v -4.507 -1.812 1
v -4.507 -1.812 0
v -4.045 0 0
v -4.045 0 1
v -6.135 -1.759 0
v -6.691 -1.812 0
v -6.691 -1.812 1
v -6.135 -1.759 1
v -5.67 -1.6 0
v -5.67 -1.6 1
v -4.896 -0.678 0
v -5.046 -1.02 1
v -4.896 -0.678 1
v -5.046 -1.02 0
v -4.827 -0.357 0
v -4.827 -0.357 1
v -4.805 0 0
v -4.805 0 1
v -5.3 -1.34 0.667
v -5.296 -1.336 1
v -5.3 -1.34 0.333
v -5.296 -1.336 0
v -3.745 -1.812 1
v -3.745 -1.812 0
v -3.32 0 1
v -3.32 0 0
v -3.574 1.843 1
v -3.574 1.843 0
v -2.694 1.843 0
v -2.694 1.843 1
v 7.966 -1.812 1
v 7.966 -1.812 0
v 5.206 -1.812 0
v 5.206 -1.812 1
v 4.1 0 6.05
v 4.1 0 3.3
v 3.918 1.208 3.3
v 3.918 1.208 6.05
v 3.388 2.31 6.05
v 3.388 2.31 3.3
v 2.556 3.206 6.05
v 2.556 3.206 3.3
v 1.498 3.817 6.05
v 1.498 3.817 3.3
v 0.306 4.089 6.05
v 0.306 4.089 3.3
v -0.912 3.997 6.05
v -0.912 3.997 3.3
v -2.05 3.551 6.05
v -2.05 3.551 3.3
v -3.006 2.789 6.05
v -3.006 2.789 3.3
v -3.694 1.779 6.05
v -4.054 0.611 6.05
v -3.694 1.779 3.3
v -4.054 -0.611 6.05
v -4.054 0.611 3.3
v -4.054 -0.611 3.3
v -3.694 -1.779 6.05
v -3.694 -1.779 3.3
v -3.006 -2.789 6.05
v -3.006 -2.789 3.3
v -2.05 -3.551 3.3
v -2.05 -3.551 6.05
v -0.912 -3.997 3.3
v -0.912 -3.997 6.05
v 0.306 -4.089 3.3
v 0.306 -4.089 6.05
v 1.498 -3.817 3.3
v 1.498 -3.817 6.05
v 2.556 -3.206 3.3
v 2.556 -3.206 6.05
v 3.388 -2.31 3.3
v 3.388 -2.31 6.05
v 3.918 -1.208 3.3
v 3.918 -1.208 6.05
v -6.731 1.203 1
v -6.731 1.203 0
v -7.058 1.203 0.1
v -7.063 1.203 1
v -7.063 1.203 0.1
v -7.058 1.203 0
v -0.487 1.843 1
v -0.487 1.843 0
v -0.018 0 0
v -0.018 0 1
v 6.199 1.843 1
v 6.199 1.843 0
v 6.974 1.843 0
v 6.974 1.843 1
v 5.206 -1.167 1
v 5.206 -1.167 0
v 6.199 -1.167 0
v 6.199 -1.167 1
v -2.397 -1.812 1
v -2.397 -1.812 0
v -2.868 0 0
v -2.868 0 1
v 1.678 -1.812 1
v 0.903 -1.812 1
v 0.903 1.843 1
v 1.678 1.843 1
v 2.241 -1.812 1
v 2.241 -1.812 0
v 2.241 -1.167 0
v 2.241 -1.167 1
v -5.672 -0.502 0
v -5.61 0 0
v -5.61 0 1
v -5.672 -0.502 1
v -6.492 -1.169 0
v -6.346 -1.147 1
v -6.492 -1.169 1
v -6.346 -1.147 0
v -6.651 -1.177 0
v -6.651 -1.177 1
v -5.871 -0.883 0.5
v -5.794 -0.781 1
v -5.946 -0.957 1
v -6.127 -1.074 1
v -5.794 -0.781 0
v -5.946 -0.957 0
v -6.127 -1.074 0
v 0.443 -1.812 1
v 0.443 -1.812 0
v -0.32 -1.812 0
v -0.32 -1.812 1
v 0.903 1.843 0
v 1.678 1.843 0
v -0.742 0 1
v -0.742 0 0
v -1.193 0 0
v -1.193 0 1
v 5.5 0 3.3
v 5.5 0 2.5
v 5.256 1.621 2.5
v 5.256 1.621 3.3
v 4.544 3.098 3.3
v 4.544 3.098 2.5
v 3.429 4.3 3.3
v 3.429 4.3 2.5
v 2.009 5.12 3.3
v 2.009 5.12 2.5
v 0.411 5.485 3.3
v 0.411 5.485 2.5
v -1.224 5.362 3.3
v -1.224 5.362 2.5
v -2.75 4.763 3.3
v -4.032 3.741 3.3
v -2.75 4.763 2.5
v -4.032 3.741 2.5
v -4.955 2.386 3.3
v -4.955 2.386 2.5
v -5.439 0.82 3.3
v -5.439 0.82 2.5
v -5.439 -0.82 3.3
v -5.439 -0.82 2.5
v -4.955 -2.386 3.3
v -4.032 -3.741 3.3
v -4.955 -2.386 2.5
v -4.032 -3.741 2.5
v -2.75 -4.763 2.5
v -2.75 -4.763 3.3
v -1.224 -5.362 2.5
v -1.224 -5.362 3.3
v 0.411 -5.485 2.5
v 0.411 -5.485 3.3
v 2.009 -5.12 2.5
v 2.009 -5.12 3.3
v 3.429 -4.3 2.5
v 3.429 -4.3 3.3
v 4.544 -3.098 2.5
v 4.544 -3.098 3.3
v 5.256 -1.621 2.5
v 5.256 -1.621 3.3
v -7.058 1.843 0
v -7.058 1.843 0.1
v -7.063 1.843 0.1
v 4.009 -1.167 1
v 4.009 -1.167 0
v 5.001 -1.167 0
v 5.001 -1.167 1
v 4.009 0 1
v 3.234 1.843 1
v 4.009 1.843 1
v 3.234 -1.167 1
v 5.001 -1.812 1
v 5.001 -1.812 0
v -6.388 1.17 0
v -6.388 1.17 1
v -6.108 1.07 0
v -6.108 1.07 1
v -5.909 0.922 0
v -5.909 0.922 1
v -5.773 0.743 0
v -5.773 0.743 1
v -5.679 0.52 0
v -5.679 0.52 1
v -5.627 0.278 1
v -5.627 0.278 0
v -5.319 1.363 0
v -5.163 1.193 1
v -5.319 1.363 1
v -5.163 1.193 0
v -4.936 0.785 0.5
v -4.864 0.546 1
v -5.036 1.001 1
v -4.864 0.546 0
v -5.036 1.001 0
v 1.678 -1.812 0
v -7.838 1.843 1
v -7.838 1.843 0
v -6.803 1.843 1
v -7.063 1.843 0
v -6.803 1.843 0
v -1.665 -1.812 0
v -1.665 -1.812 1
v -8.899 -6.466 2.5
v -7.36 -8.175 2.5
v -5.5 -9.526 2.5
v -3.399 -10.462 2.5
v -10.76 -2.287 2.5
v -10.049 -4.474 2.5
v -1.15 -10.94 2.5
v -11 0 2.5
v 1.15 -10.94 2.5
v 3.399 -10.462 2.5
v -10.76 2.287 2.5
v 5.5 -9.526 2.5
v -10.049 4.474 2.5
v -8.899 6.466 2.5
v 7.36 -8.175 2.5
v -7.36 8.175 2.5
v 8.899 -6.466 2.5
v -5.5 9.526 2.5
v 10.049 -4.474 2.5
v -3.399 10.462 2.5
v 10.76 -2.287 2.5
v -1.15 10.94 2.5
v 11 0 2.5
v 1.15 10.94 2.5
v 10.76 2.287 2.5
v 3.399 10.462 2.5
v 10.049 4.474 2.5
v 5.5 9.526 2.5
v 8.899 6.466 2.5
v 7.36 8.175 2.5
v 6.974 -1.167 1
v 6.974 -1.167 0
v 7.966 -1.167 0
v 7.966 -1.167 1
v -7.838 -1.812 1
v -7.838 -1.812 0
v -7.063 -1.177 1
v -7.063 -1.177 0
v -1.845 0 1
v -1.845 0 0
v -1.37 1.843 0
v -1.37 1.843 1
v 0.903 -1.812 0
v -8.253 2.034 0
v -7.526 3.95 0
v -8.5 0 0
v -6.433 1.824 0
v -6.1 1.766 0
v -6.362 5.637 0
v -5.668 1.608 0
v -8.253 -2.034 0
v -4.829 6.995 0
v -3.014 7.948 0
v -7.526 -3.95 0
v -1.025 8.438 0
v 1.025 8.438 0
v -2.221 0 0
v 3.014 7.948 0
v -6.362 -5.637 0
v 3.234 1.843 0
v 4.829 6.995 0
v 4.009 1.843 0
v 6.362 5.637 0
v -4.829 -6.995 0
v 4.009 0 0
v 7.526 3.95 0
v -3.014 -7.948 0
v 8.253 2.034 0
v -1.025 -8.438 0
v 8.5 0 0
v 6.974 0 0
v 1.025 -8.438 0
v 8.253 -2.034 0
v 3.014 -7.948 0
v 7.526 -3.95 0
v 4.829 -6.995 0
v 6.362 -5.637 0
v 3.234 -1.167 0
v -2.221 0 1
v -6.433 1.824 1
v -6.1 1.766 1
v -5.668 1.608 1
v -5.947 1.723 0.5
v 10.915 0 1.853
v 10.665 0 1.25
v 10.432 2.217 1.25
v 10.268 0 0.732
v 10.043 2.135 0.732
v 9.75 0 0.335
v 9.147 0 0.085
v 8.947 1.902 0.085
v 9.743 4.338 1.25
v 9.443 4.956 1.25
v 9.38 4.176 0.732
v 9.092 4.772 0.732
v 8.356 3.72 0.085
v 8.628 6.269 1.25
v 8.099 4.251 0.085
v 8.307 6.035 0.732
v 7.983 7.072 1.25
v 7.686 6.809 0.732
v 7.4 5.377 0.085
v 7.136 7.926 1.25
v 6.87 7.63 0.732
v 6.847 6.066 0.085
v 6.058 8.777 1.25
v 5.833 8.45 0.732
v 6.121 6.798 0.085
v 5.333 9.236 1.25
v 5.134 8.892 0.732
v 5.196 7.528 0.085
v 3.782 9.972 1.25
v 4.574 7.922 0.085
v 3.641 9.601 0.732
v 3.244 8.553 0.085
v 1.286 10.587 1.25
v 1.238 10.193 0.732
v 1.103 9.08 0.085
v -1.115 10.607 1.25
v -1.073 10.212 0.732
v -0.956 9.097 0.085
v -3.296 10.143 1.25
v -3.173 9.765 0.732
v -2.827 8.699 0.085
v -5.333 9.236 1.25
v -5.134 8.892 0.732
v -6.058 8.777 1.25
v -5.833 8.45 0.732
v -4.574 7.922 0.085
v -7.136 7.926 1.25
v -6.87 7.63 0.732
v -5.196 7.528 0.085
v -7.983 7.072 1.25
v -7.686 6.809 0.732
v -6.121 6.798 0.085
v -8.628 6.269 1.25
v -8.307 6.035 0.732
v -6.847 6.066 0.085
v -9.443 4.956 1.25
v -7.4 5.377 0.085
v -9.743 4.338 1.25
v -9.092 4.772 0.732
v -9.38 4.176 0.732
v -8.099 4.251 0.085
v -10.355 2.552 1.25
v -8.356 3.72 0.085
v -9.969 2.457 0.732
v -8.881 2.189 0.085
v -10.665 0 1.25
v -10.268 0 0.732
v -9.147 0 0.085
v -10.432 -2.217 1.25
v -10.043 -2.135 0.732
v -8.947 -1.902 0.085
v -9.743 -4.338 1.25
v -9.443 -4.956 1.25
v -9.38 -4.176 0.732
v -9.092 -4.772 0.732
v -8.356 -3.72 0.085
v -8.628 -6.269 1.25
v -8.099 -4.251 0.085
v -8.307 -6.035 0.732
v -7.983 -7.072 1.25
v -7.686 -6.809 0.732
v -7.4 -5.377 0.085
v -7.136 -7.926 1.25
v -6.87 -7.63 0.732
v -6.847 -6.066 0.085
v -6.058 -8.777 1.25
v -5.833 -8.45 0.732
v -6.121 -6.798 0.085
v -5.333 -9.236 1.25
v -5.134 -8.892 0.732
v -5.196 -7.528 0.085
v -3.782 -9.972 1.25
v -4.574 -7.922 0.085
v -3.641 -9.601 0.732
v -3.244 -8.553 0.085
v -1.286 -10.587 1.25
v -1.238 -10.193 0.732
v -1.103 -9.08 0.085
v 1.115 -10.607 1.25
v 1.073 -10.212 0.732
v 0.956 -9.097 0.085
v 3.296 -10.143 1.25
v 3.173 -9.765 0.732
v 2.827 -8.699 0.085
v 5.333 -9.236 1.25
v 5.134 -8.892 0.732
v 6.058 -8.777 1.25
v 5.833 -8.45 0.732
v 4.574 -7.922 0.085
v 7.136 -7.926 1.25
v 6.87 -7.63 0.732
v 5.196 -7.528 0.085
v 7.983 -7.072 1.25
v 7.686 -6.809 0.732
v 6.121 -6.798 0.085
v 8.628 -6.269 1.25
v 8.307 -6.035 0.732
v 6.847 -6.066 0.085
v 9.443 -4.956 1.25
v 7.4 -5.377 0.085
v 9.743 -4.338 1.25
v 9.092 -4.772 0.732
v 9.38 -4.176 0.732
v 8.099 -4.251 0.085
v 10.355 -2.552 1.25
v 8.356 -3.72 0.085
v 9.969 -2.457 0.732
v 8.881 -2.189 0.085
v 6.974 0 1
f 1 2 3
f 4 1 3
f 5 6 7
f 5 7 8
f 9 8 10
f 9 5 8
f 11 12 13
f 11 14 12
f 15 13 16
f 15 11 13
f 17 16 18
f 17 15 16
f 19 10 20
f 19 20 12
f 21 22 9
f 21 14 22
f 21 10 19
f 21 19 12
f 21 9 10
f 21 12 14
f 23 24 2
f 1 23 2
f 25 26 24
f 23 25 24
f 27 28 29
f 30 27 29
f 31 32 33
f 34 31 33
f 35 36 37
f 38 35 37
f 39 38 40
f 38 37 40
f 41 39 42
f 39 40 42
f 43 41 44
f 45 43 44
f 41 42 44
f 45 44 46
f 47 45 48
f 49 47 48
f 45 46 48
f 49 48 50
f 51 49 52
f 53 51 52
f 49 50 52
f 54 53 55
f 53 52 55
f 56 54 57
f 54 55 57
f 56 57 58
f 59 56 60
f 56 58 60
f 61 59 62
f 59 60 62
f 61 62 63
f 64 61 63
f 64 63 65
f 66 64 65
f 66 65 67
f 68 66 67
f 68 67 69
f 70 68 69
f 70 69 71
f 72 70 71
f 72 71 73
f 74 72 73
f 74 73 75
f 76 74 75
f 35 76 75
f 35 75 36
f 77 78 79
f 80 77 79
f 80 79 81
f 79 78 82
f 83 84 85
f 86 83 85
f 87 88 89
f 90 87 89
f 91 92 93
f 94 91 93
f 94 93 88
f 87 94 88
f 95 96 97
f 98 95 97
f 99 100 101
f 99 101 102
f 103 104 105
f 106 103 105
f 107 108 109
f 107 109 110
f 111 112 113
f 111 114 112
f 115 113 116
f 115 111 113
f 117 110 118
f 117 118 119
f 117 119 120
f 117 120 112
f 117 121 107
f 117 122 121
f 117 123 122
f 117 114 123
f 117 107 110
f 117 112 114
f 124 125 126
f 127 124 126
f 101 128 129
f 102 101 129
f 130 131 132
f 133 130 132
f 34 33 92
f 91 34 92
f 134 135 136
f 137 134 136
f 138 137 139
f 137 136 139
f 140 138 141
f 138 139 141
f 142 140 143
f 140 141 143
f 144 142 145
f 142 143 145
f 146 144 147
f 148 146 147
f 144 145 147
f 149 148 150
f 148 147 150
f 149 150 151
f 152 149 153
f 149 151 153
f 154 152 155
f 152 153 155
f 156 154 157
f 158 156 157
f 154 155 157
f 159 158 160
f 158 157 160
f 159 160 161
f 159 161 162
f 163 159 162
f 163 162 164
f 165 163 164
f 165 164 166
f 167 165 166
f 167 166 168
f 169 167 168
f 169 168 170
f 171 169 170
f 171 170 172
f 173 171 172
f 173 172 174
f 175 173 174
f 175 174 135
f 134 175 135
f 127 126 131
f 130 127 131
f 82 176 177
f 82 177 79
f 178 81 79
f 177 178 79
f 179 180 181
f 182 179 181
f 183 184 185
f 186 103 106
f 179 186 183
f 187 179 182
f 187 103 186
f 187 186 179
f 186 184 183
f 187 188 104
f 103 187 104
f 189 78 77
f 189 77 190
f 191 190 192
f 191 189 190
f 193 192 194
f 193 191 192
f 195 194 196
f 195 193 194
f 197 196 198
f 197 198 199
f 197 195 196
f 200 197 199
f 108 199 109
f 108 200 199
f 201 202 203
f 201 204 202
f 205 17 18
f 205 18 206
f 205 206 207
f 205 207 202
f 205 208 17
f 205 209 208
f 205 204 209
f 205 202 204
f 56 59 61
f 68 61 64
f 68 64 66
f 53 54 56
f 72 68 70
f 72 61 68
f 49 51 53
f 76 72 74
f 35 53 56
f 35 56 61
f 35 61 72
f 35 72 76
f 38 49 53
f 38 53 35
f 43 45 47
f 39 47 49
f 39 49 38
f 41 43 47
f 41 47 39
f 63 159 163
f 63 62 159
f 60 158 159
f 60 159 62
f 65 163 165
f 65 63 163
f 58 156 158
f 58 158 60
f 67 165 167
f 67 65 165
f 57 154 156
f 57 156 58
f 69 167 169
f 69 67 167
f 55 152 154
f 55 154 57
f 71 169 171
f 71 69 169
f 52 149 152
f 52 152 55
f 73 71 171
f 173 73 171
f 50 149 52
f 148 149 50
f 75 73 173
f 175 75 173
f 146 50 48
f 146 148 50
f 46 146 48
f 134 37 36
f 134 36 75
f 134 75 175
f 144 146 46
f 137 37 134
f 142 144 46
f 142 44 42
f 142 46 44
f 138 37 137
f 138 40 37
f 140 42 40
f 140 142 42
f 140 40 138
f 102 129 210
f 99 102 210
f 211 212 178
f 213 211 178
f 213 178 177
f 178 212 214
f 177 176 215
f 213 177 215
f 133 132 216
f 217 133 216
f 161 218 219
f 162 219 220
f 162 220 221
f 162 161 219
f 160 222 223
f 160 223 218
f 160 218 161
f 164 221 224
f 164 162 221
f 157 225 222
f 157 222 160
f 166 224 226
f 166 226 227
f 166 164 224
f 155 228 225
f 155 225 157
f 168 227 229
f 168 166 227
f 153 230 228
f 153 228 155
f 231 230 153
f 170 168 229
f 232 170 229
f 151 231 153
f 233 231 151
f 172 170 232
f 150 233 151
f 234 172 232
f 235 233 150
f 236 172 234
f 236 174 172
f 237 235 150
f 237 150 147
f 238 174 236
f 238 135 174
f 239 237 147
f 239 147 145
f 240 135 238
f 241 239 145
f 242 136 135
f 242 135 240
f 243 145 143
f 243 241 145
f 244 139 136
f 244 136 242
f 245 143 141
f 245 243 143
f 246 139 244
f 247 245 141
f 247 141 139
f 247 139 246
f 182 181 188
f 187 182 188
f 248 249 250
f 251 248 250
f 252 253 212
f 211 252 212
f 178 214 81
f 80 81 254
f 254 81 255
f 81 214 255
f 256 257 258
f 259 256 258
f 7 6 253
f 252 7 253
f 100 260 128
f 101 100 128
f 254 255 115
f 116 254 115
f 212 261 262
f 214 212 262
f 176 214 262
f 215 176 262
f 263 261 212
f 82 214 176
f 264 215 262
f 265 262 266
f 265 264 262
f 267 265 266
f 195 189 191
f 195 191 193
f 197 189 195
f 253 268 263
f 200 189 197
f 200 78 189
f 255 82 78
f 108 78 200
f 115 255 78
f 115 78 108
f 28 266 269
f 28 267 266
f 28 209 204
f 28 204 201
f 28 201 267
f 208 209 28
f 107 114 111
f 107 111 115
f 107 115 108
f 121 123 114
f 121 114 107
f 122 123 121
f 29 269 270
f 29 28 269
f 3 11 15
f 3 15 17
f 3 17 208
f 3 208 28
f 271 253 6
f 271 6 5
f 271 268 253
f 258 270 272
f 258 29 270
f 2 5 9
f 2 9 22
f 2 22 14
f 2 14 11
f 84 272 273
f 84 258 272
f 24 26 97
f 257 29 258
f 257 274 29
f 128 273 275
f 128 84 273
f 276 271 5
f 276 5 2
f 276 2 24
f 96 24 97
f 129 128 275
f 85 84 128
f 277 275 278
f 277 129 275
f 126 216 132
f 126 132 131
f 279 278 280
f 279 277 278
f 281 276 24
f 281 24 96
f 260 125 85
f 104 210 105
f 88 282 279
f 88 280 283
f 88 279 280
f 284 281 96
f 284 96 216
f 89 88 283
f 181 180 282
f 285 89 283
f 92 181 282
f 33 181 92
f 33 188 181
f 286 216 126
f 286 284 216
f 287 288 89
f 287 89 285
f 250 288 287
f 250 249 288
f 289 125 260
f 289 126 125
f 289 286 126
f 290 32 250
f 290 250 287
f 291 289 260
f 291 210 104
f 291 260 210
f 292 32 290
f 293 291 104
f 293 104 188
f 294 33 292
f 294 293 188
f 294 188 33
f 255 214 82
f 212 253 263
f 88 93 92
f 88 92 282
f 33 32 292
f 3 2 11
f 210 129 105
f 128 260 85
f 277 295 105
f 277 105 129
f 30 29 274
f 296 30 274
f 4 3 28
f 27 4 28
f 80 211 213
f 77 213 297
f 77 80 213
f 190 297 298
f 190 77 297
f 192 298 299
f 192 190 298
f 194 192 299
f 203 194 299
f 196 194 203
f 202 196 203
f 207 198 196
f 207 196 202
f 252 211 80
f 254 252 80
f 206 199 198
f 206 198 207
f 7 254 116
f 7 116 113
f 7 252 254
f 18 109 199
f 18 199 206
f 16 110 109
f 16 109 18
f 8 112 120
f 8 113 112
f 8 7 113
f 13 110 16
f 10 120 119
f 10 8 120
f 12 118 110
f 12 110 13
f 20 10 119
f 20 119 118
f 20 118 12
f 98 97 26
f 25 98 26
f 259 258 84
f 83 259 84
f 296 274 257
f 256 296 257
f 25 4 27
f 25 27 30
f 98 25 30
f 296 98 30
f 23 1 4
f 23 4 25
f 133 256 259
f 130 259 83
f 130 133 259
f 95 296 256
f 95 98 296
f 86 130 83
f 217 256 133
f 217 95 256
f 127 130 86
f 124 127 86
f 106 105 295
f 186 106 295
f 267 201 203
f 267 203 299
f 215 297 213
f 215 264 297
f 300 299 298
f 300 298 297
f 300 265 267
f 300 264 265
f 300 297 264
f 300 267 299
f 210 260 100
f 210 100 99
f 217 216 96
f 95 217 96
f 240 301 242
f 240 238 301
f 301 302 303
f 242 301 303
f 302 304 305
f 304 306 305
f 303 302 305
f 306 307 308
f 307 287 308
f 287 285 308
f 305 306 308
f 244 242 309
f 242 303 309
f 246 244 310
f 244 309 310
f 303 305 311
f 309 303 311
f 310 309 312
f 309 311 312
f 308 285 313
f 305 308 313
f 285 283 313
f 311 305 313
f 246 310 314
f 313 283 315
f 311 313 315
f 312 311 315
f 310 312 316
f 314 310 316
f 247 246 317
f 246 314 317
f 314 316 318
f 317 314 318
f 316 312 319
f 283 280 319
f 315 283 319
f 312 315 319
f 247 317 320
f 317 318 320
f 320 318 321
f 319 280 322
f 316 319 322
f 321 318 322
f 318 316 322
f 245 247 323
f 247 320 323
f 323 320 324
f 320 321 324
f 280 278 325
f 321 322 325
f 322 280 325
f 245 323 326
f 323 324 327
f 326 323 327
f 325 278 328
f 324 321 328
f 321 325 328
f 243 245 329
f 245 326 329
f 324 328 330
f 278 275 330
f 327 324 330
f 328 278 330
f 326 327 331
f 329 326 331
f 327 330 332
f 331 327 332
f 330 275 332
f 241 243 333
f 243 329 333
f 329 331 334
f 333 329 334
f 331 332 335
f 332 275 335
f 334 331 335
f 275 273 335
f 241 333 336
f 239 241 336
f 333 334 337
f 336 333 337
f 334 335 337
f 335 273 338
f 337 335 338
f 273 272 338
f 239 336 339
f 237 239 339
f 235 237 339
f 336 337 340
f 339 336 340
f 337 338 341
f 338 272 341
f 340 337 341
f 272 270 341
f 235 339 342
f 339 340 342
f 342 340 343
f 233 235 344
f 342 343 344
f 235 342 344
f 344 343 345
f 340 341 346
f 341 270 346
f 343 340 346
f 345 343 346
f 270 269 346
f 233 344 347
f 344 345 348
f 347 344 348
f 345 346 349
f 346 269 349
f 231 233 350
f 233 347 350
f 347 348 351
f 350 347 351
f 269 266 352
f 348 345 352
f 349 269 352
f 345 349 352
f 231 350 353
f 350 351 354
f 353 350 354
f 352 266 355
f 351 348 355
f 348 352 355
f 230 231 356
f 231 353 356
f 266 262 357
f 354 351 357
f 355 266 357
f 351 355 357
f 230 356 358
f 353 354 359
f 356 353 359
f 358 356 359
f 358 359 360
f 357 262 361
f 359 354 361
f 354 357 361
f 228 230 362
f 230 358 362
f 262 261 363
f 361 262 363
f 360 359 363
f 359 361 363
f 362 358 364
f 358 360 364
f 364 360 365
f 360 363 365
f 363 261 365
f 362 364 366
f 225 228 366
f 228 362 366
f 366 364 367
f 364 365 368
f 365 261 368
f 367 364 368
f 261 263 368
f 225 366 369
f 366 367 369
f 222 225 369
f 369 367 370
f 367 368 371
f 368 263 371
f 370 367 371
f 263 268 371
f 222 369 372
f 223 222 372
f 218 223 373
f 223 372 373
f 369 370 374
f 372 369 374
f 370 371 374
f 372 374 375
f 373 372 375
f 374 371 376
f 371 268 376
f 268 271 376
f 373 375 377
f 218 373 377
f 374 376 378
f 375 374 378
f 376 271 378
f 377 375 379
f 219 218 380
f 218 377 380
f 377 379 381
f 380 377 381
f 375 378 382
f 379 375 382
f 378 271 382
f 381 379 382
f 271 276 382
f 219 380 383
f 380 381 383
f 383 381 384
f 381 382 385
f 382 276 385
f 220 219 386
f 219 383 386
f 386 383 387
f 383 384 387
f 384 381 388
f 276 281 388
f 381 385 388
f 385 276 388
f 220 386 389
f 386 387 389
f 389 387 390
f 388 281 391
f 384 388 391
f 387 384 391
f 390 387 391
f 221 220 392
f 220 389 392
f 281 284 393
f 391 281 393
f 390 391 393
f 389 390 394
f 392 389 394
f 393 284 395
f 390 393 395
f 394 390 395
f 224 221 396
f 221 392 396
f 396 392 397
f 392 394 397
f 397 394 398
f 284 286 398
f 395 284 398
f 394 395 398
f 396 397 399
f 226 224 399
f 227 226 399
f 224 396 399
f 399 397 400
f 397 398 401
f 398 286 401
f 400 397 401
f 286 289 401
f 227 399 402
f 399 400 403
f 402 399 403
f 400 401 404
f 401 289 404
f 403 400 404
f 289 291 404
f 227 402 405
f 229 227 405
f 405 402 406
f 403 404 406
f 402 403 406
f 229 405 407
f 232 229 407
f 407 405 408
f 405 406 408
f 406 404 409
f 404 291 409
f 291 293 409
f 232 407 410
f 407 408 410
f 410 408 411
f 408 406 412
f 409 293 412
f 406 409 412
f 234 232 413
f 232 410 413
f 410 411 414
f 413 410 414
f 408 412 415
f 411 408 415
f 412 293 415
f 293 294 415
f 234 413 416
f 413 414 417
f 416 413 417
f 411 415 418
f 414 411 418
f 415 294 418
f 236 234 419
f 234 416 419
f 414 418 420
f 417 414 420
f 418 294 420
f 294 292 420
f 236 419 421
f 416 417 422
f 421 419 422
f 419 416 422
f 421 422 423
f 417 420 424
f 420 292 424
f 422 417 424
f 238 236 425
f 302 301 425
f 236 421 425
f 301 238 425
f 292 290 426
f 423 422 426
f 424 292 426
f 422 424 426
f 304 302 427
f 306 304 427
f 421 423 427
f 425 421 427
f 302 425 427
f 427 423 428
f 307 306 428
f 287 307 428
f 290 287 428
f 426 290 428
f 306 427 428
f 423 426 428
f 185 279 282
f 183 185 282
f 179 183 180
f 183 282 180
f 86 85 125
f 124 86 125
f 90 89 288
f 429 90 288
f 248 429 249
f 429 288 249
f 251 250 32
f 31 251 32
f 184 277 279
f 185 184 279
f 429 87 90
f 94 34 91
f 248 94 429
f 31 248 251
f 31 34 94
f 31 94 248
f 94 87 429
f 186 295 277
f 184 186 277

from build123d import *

# Parameters (mm, degrees)
F0_R      = 11
F0_R_2    = 5.5
F1_DEPTH  = 2.5
F0_R_3    = 4.1
F2_DEPTH  = 3.3
F3_DEPTH  = 6.05
F4_R      = 2.49999
F7_W      = 0.7752131331
F7_H      = 1.8432312268
F7_H_2    = 1.8120306982
F8_DEPTH  = 1
F9_W      = 0.005
F9_H      = 0.6400108426
F10_DEPTH = 0.1


# Not quite as in the source:
# - a fillet or chamfer is up to 0.001 mm smaller than in the source, because OpenCascade refuses the exact size


with BuildPart() as f1:
    # F0 (on Top) → F1 (new body)
    with BuildSketch(Plane.XY):
        Circle(F0_R)
        Circle(F0_R_2, mode=Mode.SUBTRACT)
    extrude(amount=F1_DEPTH)

    # F0 (on Top) → F2 (join, through all)
    with BuildSketch(Plane.XY):
        Circle(F0_R_2)
        Circle(F0_R_3, mode=Mode.SUBTRACT)
    extrude(amount=F2_DEPTH)

    # F0 (on Top) → F3 (join, through all)
    with BuildSketch(Plane.XY):
        Circle(F0_R_3)
    extrude(amount=F3_DEPTH)

    # F4 (radius 2.5 in the source; OpenCascade refuses exactly that, so slightly less here)
    f4_edges = [f1.edges().sort_by_distance(p)[0] for p in [
        (-11, 0, 0),
    ]]
    fillet(f4_edges, radius=F4_R)

    # F7 (on face) → F8 (cut)
    with BuildSketch(Plane(origin=(0, 0, 0), x_dir=(1, 0, 0), z_dir=(0, 0, -1))):
        with BuildLine():
            Line((-7.8377327815, 1.8120306982), (-7.8377327815, 0))
            Line((-7.8377327815, 0), (-7.0625196484, 0))
            Line((-7.0625196484, 0), (-7.0625196484, 1.1768199369))
            Line((-7.0625196484, 1.1768199369), (-6.6505126685, 1.1768199369))
            add(Edge.make_bspline(
                [(-5.6104951692, 0), (-5.6108483761, 1.1768199369), (-6.6505126685, 1.1768199369)],
                knots=[0.0003397316, 0.0003397316, 0.0003397316, 1, 1, 1], degree=2))
            Line((-5.6104951692, 0), (-4.8049398646, 0))
            add(Edge.make_bspline(
                [(-4.804881401, 0.0192003253), (-4.804881401, 0.0095761402), (-4.8049398646, 0)],
                knots=[0, 0, 0, 0.010664918, 0.010664918, 0.010664918], degree=2))
            add(Edge.make_bspline(
                [(-5.3000897905, 1.339622695), (-4.804881401, 0.8672146918), (-4.804881401, 0.0192003253)],
                knots=[0, 0, 0, 1, 1, 1], degree=2))
            add(Edge.make_bspline(
                [(-6.6905133461, 1.8120306982), (-5.79529818, 1.8120306982), (-5.3000897905, 1.339622695)],
                knots=[0, 0, 0, 1, 1, 1], degree=2))
            Line((-6.6905133461, 1.8120306982), (-7.8377327815, 1.8120306982))
        make_face()
        with BuildLine():
            Line((-7.0625196484, 0), (-7.8377327815, 0))
            Line((-7.8377327815, 0), (-7.8377327815, -1.8432312268))
            Line((-7.8377327815, -1.8432312268), (-6.8025152436, -1.8432312268))
            add(Edge.make_bspline(
                [(-5.318890109, -1.3632230948), (-5.832898817, -1.8432312268), (-6.8025152436, -1.8432312268)],
                knots=[0, 0, 0, 1, 1, 1], degree=2))
            add(Edge.make_bspline(
                [(-4.8049398646, 0), (-4.8103632617, -0.8883342102), (-5.318890109, -1.3632230948)],
                knots=[0.010664918, 0.010664918, 0.010664918, 1, 1, 1], degree=2))
            Line((-4.8049398646, 0), (-5.6104951692, 0))
            add(Edge.make_bspline(
                [(-5.6104950492, -0.0008000136), (-5.6104950492, -0.0003999388), (-5.6104951692, 0)],
                knots=[0, 0, 0, 0.0003397316, 0.0003397316, 0.0003397316], degree=2))
            add(Edge.make_bspline(
                [(-6.7305140238, -1.2032203841), (-5.6104950492, -1.2032203841), (-5.6104950492, -0.0008000136)],
                knots=[0, 0, 0, 1, 1, 1], degree=2))
            Line((-6.7305140238, -1.2032203841), (-7.0625196484, -1.2032203841))
            Line((-7.0625196484, -1.2032203841), (-7.0625196484, 0))
        make_face()
        Polygon((6.1985050109, 1.1672197742), (6.1985050109, 0), (6.973718144, 0), (6.973718144, 1.1672197742), (7.9657349501, 1.1672197742), (7.9657349501, 1.8120306982), (5.2056881912, 1.8120306982), (5.2056881912, 1.1672197742), align=None)
        with Locations((6.5861115774, -0.9216156134)):
            Rectangle(F7_W, F7_H)
        Polygon((3.2336547824, 1.1672197742), (3.2336547824, 0), (4.0088679155, 0), (4.0088679155, 1.1672197742), (5.0008847216, 1.1672197742), (5.0008847216, 1.8120306982), (2.2408379628, 1.8120306982), (2.2408379628, 1.1672197742), align=None)
        with Locations((3.6212613489, -0.9216156134)):
            Rectangle(F7_W, F7_H)
        with Locations((1.2908218682, 0.9060153491)):
            Rectangle(F7_W, F7_H_2)
        with Locations((1.2908218682, -0.9216156134)):
            Rectangle(F7_W, F7_H)
        Polygon((-4.5072763592, 1.8120306982), (-4.044849615, 0), (-3.3198281749, 0), (-3.7448634429, 1.8120306982), align=None)
        with BuildLine():
            Line((-3.3198281749, 0), (-4.044849615, 0))
            Line((-4.044849615, 0), (-3.5744605561, -1.8432312268))
            Line((-3.5744605561, -1.8432312268), (-2.6944456475, -1.8432312268))
            Line((-2.6944456475, -1.8432312268), (-2.2209338662, 0))
            Line((-2.2209338662, 0), (-2.868251717, 0))
            Line((-2.868251717, 0), (-2.9296496321, -0.2360039982))
            add(Edge.make_bspline(
                [(-3.0308513466, -0.6996118523), (-2.9768504318, -0.4008067902), (-2.9296496321, -0.2360039982)],
                knots=[0, 0, 0, 1, 1, 1], degree=2))
            add(Edge.make_bspline(
                [(-3.100052519, -1.140819327), (-3.0848522615, -0.9984169145), (-3.0308513466, -0.6996118523)],
                knots=[0, 0, 0, 1, 1, 1], degree=2))
            add(Edge.make_bspline(
                [(-3.2768555143, -0.1832031037), (-3.1544534406, -0.736012469), (-3.100052519, -1.140819327)],
                knots=[0, 0, 0, 1, 1, 1], degree=2))
            Line((-3.2768555143, -0.1832031037), (-3.3198281749, 0))
        make_face()
        with BuildLine():
            Line((-2.868251717, 0), (-3.3198281749, 0))
            Line((-3.3198281749, 0), (-3.2768555143, -0.1832031037))
            add(Edge.make_bspline(
                [(-3.2768555143, -0.1832031037), (-3.1544534406, -0.736012469), (-3.100052519, -1.140819327)],
                knots=[0, 0, 0, 1, 1, 1], degree=2))
            add(Edge.make_bspline(
                [(-3.100052519, -1.140819327), (-3.0848522615, -0.9984169145), (-3.0308513466, -0.6996118523)],
                knots=[0, 0, 0, 1, 1, 1], degree=2))
            add(Edge.make_bspline(
                [(-3.0308513466, -0.6996118523), (-2.9768504318, -0.4008067902), (-2.9296496321, -0.2360039982)],
                knots=[0, 0, 0, 1, 1, 1], degree=2))
            Line((-2.9296496321, -0.2360039982), (-2.868251717, 0))
        make_face()
        with BuildLine():
            Line((-2.3968406056, 1.8120306982), (-2.868251717, 0))
            Line((-2.868251717, 0), (-2.2209338662, 0))
            Line((-2.2209338662, 0), (-2.2024373122, 0.0720012198))
            add(Edge.make_bspline(
                [(-2.10963574, 0.4980084369), (-2.1696367565, 0.1992033748), (-2.2024373122, 0.0720012198)],
                knots=[0, 0, 0, 1, 1, 1], degree=2))
            add(Edge.make_bspline(
                [(-2.034434466, 0.9320157896), (-2.0496347235, 0.7968134991), (-2.10963574, 0.4980084369)],
                knots=[0, 0, 0, 1, 1, 1], degree=2))
            add(Edge.make_bspline(
                [(-1.9584331784, 0.5004084776), (-2.0248343034, 0.8216139192), (-2.034434466, 0.9320157896)],
                knots=[0, 0, 0, 1, 1, 1], degree=2))
            add(Edge.make_bspline(
                [(-1.8648315927, 0.0768013011), (-1.8920320535, 0.1792030359), (-1.9584331784, 0.5004084776)],
                knots=[0, 0, 0, 1, 1, 1], degree=2))
            Line((-1.8648315927, 0.0768013011), (-1.8450232571, 0))
            Line((-1.8450232571, 0), (-1.1934170931, 0))
            Line((-1.1934170931, 0), (-1.6648282044, 1.8120306982))
            Line((-1.6648282044, 1.8120306982), (-2.3968406056, 1.8120306982))
        make_face()
        with BuildLine():
            Line((-2.2024373122, 0.0720012198), (-2.2209338662, 0))
            Line((-2.2209338662, 0), (-1.8450232571, 0))
            Line((-1.8450232571, 0), (-1.8648315927, 0.0768013011))
            add(Edge.make_bspline(
                [(-1.8648315927, 0.0768013011), (-1.8920320535, 0.1792030359), (-1.9584331784, 0.5004084776)],
                knots=[0, 0, 0, 1, 1, 1], degree=2))
            add(Edge.make_bspline(
                [(-1.9584331784, 0.5004084776), (-2.0248343034, 0.8216139192), (-2.034434466, 0.9320157896)],
                knots=[0, 0, 0, 1, 1, 1], degree=2))
            add(Edge.make_bspline(
                [(-2.034434466, 0.9320157896), (-2.0496347235, 0.7968134991), (-2.10963574, 0.4980084369)],
                knots=[0, 0, 0, 1, 1, 1], degree=2))
            add(Edge.make_bspline(
                [(-2.10963574, 0.4980084369), (-2.1696367565, 0.1992033748), (-2.2024373122, 0.0720012198)],
                knots=[0, 0, 0, 1, 1, 1], degree=2))
        make_face()
        with BuildLine():
            Line((-1.1934170931, 0), (-1.8450232571, 0))
            Line((-1.8450232571, 0), (-1.3696232032, -1.8432312268))
            Line((-1.3696232032, -1.8432312268), (-0.487208254, -1.8432312268))
            Line((-0.487208254, -1.8432312268), (-0.0180294584, 0))
            Line((-0.0180294584, 0), (-0.7421344653, 0))
            Line((-0.7421344653, 0), (-0.7848132958, -0.1832031037))
            add(Edge.make_bspline(
                [(-0.8848149899, -0.6544110866), (-0.8296140548, -0.3632061532), (-0.7848132958, -0.1832031037)],
                knots=[0, 0, 0, 1, 1, 1], degree=2))
            add(Edge.make_bspline(
                [(-0.9648163453, -1.140819327), (-0.9400159251, -0.94561602), (-0.8848149899, -0.6544110866)],
                knots=[0, 0, 0, 1, 1, 1], degree=2))
            add(Edge.make_bspline(
                [(-1.0444176938, -0.6556111069), (-0.9920168061, -0.938415898), (-0.9648163453, -1.140819327)],
                knots=[0, 0, 0, 1, 1, 1], degree=2))
            add(Edge.make_bspline(
                [(-1.1320191779, -0.2360039982), (-1.0968185816, -0.3728063158), (-1.0444176938, -0.6556111069)],
                knots=[0, 0, 0, 1, 1, 1], degree=2))
            Line((-1.1320191779, -0.2360039982), (-1.1934170931, 0))
        make_face()
        with BuildLine():
            Line((-0.7421344653, 0), (-1.1934170931, 0))
            Line((-1.1934170931, 0), (-1.1320191779, -0.2360039982))
            add(Edge.make_bspline(
                [(-1.1320191779, -0.2360039982), (-1.0968185816, -0.3728063158), (-1.0444176938, -0.6556111069)],
                knots=[0, 0, 0, 1, 1, 1], degree=2))
            add(Edge.make_bspline(
                [(-1.0444176938, -0.6556111069), (-0.9920168061, -0.938415898), (-0.9648163453, -1.140819327)],
                knots=[0, 0, 0, 1, 1, 1], degree=2))
            add(Edge.make_bspline(
                [(-0.9648163453, -1.140819327), (-0.9400159251, -0.94561602), (-0.8848149899, -0.6544110866)],
                knots=[0, 0, 0, 1, 1, 1], degree=2))
            add(Edge.make_bspline(
                [(-0.8848149899, -0.6544110866), (-0.8296140548, -0.3632061532), (-0.7848132958, -0.1832031037)],
                knots=[0, 0, 0, 1, 1, 1], degree=2))
            Line((-0.7848132958, -0.1832031037), (-0.7421344653, 0))
        make_face()
        Polygon((-0.3200054213, 1.8120306982), (-0.7421344653, 0), (-0.0180294584, 0), (0.4432075085, 1.8120306982), align=None)
    extrude(amount=-F8_DEPTH, mode=Mode.SUBTRACT)

    # F9 (on face) → F10 (join)
    with BuildSketch(Plane(origin=(0, 0, 0), x_dir=(1, 0, 0), z_dir=(0, 0, -1))):
        with Locations((-7.0600196484, -1.5232258055)):
            Rectangle(F9_W, F9_H)
    extrude(amount=-F10_DEPTH)


solid = f1.part
